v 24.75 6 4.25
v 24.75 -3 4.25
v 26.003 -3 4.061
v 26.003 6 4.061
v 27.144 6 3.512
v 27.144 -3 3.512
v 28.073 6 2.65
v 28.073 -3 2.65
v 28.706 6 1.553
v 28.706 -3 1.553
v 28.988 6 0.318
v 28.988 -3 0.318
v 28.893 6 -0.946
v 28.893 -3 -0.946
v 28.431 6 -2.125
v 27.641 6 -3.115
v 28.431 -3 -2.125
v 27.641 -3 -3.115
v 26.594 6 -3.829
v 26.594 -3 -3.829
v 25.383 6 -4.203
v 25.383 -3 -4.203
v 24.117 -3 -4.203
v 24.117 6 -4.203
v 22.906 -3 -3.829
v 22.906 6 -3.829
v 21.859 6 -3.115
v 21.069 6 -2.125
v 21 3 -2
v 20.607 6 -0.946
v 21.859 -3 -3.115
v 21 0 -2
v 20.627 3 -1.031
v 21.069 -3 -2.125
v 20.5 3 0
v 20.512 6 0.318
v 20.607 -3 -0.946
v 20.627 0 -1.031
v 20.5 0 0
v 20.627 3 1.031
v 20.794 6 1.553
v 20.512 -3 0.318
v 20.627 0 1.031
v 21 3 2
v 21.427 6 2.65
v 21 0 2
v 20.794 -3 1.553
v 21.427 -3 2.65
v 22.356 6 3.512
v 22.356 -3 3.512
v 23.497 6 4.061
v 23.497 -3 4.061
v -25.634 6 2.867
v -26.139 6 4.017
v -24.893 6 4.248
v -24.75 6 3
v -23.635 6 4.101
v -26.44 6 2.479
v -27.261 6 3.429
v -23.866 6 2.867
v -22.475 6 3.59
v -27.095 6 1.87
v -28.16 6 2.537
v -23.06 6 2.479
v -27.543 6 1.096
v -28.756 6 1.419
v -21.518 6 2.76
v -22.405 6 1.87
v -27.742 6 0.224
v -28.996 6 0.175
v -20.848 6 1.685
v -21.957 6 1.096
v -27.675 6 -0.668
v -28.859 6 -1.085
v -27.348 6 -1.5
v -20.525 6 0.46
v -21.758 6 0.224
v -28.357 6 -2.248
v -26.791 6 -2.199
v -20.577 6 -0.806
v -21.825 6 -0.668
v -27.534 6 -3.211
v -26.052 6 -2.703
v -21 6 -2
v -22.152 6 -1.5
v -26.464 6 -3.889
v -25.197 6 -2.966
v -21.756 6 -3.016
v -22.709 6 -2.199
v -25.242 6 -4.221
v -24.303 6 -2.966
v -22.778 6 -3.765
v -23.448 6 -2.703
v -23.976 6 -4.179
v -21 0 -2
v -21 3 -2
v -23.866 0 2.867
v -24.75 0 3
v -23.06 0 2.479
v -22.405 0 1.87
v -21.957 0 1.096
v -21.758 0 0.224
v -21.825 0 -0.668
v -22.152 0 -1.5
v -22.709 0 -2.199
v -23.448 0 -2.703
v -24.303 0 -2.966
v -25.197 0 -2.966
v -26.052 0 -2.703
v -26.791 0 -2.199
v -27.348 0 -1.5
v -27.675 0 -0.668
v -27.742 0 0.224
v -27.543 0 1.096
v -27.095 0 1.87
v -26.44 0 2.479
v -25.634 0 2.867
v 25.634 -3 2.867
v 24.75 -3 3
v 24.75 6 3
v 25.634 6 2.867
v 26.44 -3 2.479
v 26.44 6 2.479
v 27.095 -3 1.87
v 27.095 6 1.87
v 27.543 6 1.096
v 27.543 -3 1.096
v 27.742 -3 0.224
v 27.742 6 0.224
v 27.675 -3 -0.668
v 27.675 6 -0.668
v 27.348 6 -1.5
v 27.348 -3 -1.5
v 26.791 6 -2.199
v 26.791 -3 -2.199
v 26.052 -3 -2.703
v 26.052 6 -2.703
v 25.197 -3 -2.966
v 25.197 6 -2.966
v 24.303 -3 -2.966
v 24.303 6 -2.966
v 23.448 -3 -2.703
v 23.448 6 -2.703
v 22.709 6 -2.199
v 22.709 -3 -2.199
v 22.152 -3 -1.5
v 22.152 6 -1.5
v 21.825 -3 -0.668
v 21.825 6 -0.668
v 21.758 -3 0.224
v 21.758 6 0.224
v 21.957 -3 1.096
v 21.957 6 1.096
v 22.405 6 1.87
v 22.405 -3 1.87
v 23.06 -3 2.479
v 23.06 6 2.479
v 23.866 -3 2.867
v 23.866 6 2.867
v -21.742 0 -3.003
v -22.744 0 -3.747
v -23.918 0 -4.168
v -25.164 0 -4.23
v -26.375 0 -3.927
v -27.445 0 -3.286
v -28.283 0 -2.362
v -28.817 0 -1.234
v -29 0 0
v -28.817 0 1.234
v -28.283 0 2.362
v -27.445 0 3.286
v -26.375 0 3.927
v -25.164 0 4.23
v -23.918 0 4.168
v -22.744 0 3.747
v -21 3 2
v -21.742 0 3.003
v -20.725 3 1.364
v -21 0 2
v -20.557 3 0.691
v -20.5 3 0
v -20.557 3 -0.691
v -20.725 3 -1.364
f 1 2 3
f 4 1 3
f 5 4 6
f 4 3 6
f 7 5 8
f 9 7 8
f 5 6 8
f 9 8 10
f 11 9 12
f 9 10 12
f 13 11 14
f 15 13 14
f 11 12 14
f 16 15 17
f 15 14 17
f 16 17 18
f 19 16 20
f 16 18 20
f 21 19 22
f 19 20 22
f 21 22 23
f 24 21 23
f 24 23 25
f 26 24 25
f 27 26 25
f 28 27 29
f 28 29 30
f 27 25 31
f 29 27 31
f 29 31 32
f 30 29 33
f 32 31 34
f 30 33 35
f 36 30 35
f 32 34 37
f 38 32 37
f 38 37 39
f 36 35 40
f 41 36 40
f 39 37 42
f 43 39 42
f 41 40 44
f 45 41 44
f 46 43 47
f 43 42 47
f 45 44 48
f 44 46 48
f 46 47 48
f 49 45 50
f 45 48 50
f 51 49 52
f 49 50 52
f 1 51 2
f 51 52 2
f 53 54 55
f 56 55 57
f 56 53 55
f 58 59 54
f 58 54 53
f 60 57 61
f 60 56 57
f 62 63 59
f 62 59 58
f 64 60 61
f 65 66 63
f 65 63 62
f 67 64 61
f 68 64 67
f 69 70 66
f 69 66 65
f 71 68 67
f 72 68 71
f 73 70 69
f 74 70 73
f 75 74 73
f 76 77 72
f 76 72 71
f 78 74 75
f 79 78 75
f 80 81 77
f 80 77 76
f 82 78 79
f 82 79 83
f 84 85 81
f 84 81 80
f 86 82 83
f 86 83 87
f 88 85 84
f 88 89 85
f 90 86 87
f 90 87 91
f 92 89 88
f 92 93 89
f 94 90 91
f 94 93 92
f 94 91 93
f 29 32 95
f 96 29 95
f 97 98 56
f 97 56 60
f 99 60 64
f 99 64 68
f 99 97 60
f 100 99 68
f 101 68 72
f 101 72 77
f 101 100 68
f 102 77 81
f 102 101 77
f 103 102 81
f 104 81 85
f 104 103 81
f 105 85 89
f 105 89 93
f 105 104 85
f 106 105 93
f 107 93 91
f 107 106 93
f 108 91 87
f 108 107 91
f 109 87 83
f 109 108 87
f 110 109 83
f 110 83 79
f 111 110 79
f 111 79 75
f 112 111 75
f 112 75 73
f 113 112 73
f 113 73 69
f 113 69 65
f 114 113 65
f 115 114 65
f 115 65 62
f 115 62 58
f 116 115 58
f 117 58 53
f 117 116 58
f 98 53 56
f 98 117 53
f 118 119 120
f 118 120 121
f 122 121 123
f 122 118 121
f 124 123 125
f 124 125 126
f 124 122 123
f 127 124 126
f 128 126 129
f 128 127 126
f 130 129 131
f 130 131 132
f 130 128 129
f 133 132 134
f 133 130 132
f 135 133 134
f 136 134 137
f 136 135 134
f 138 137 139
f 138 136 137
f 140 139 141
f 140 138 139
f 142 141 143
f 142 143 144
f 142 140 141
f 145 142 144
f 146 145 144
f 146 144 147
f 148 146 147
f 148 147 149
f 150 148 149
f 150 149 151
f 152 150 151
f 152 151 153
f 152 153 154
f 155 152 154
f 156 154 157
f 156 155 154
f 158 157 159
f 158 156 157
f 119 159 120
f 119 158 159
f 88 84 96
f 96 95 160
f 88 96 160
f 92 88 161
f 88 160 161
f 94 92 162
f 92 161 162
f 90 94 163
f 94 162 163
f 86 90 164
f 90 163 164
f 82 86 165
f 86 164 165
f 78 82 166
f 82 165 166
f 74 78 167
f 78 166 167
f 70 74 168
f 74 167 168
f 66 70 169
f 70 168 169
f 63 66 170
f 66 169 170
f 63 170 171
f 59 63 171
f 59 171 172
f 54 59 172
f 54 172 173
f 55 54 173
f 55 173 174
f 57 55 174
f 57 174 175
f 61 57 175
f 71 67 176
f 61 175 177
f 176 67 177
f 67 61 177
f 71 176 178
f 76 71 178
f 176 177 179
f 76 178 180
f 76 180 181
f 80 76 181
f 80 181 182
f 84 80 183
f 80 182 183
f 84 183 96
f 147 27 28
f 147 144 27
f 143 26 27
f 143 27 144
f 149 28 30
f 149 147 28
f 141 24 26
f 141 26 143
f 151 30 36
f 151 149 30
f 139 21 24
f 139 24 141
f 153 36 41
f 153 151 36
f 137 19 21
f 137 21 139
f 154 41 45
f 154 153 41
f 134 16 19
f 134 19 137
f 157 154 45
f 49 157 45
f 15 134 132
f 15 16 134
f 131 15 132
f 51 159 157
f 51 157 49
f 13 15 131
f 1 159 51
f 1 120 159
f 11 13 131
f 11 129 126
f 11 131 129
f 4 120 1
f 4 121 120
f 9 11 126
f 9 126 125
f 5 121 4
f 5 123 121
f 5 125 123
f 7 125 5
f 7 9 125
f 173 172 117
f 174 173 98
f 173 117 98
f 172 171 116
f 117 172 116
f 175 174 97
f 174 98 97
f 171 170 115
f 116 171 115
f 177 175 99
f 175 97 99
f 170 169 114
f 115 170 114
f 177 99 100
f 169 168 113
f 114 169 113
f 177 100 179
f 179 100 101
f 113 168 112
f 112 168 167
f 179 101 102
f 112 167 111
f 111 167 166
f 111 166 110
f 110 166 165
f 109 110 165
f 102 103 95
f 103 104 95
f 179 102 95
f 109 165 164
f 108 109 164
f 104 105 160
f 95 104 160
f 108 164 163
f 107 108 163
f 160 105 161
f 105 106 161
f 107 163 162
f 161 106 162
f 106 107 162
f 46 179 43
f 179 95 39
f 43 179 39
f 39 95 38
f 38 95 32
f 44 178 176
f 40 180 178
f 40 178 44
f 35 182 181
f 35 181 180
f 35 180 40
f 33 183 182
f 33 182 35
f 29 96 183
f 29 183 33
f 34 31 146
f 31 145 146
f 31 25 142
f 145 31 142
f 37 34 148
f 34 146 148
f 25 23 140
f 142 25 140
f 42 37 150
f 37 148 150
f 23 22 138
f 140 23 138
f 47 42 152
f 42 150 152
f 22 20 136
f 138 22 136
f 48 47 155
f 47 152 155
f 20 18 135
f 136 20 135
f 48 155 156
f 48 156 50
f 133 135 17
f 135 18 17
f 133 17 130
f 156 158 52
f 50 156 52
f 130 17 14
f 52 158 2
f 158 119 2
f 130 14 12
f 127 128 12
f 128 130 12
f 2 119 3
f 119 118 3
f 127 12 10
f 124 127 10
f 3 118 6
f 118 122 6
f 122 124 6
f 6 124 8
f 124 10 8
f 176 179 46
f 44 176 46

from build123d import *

# Parameters (mm, degrees)
BOSS_EXTRUDE1_DEPTH      = 3
SKETCH2_3_R              = 3
BOSS_EXTRUDE2_DEPTH      = 6
BOSS_EXTRUDE3_DEPTH      = 6
BOSS_EXTRUDE3_DEPTH_BACK = 3
SKETCH2_4_R              = 3


with BuildPart() as part:
    # Sketch2 → Boss-Extrude1 (new body)
    with BuildSketch(Plane(origin=(0, 0, 0), x_dir=(1, 0, 0), z_dir=(0, 1, 0))):
        with BuildLine():
            ThreePointArc((21, -2), (20.5, 0), (21, 2))
            Line((21, 2), (-21, 2))
            ThreePointArc((-21, 2), (-20.626894374, 1.030776406), (-20.5, 0))
            ThreePointArc((-20.5, 0), (-20.626894374, -1.030776406), (-21, -2))
            Line((-21, -2), (21, -2))
        make_face()
    extrude(amount=BOSS_EXTRUDE1_DEPTH)

    # Sketch2<3> → Boss-Extrude2 (add)
    with BuildSketch(Plane(origin=(0, 0, 0), x_dir=(1, 0, 0), z_dir=(0, 1, 0))):
        with BuildLine():
            ThreePointArc((-20.5, 0), (-20.626894374, 1.030776406), (-21, 2))
            ThreePointArc((-21, 2), (-29, 0), (-21, -2))
            ThreePointArc((-21, -2), (-20.626894374, -1.030776406), (-20.5, 0))
        make_face()
        with Locations((-24.75, 0)):
            Circle(SKETCH2_3_R, mode=Mode.SUBTRACT)
    extrude(amount=BOSS_EXTRUDE2_DEPTH)

    # Sketch2<4> → Boss-Extrude3 (add, two sides: drawn at the far end of the back side and taken through both)
    with BuildSketch(Plane(origin=(0, 0, 0), x_dir=(1, 0, 0), z_dir=(0, 1, 0)).offset(-BOSS_EXTRUDE3_DEPTH_BACK)):
        with BuildLine():
            ThreePointArc((29, 0), (25.780776406, 4.123105626), (21, 2))
            ThreePointArc((21, 2), (20.5, 0), (21, -2))
            ThreePointArc((21, -2), (25.780776406, -4.123105626), (29, 0))
        make_face()
        with Locations((24.75, 0)):
            Circle(SKETCH2_4_R, mode=Mode.SUBTRACT)
    extrude(amount=BOSS_EXTRUDE3_DEPTH + BOSS_EXTRUDE3_DEPTH_BACK)


solid = part.part
